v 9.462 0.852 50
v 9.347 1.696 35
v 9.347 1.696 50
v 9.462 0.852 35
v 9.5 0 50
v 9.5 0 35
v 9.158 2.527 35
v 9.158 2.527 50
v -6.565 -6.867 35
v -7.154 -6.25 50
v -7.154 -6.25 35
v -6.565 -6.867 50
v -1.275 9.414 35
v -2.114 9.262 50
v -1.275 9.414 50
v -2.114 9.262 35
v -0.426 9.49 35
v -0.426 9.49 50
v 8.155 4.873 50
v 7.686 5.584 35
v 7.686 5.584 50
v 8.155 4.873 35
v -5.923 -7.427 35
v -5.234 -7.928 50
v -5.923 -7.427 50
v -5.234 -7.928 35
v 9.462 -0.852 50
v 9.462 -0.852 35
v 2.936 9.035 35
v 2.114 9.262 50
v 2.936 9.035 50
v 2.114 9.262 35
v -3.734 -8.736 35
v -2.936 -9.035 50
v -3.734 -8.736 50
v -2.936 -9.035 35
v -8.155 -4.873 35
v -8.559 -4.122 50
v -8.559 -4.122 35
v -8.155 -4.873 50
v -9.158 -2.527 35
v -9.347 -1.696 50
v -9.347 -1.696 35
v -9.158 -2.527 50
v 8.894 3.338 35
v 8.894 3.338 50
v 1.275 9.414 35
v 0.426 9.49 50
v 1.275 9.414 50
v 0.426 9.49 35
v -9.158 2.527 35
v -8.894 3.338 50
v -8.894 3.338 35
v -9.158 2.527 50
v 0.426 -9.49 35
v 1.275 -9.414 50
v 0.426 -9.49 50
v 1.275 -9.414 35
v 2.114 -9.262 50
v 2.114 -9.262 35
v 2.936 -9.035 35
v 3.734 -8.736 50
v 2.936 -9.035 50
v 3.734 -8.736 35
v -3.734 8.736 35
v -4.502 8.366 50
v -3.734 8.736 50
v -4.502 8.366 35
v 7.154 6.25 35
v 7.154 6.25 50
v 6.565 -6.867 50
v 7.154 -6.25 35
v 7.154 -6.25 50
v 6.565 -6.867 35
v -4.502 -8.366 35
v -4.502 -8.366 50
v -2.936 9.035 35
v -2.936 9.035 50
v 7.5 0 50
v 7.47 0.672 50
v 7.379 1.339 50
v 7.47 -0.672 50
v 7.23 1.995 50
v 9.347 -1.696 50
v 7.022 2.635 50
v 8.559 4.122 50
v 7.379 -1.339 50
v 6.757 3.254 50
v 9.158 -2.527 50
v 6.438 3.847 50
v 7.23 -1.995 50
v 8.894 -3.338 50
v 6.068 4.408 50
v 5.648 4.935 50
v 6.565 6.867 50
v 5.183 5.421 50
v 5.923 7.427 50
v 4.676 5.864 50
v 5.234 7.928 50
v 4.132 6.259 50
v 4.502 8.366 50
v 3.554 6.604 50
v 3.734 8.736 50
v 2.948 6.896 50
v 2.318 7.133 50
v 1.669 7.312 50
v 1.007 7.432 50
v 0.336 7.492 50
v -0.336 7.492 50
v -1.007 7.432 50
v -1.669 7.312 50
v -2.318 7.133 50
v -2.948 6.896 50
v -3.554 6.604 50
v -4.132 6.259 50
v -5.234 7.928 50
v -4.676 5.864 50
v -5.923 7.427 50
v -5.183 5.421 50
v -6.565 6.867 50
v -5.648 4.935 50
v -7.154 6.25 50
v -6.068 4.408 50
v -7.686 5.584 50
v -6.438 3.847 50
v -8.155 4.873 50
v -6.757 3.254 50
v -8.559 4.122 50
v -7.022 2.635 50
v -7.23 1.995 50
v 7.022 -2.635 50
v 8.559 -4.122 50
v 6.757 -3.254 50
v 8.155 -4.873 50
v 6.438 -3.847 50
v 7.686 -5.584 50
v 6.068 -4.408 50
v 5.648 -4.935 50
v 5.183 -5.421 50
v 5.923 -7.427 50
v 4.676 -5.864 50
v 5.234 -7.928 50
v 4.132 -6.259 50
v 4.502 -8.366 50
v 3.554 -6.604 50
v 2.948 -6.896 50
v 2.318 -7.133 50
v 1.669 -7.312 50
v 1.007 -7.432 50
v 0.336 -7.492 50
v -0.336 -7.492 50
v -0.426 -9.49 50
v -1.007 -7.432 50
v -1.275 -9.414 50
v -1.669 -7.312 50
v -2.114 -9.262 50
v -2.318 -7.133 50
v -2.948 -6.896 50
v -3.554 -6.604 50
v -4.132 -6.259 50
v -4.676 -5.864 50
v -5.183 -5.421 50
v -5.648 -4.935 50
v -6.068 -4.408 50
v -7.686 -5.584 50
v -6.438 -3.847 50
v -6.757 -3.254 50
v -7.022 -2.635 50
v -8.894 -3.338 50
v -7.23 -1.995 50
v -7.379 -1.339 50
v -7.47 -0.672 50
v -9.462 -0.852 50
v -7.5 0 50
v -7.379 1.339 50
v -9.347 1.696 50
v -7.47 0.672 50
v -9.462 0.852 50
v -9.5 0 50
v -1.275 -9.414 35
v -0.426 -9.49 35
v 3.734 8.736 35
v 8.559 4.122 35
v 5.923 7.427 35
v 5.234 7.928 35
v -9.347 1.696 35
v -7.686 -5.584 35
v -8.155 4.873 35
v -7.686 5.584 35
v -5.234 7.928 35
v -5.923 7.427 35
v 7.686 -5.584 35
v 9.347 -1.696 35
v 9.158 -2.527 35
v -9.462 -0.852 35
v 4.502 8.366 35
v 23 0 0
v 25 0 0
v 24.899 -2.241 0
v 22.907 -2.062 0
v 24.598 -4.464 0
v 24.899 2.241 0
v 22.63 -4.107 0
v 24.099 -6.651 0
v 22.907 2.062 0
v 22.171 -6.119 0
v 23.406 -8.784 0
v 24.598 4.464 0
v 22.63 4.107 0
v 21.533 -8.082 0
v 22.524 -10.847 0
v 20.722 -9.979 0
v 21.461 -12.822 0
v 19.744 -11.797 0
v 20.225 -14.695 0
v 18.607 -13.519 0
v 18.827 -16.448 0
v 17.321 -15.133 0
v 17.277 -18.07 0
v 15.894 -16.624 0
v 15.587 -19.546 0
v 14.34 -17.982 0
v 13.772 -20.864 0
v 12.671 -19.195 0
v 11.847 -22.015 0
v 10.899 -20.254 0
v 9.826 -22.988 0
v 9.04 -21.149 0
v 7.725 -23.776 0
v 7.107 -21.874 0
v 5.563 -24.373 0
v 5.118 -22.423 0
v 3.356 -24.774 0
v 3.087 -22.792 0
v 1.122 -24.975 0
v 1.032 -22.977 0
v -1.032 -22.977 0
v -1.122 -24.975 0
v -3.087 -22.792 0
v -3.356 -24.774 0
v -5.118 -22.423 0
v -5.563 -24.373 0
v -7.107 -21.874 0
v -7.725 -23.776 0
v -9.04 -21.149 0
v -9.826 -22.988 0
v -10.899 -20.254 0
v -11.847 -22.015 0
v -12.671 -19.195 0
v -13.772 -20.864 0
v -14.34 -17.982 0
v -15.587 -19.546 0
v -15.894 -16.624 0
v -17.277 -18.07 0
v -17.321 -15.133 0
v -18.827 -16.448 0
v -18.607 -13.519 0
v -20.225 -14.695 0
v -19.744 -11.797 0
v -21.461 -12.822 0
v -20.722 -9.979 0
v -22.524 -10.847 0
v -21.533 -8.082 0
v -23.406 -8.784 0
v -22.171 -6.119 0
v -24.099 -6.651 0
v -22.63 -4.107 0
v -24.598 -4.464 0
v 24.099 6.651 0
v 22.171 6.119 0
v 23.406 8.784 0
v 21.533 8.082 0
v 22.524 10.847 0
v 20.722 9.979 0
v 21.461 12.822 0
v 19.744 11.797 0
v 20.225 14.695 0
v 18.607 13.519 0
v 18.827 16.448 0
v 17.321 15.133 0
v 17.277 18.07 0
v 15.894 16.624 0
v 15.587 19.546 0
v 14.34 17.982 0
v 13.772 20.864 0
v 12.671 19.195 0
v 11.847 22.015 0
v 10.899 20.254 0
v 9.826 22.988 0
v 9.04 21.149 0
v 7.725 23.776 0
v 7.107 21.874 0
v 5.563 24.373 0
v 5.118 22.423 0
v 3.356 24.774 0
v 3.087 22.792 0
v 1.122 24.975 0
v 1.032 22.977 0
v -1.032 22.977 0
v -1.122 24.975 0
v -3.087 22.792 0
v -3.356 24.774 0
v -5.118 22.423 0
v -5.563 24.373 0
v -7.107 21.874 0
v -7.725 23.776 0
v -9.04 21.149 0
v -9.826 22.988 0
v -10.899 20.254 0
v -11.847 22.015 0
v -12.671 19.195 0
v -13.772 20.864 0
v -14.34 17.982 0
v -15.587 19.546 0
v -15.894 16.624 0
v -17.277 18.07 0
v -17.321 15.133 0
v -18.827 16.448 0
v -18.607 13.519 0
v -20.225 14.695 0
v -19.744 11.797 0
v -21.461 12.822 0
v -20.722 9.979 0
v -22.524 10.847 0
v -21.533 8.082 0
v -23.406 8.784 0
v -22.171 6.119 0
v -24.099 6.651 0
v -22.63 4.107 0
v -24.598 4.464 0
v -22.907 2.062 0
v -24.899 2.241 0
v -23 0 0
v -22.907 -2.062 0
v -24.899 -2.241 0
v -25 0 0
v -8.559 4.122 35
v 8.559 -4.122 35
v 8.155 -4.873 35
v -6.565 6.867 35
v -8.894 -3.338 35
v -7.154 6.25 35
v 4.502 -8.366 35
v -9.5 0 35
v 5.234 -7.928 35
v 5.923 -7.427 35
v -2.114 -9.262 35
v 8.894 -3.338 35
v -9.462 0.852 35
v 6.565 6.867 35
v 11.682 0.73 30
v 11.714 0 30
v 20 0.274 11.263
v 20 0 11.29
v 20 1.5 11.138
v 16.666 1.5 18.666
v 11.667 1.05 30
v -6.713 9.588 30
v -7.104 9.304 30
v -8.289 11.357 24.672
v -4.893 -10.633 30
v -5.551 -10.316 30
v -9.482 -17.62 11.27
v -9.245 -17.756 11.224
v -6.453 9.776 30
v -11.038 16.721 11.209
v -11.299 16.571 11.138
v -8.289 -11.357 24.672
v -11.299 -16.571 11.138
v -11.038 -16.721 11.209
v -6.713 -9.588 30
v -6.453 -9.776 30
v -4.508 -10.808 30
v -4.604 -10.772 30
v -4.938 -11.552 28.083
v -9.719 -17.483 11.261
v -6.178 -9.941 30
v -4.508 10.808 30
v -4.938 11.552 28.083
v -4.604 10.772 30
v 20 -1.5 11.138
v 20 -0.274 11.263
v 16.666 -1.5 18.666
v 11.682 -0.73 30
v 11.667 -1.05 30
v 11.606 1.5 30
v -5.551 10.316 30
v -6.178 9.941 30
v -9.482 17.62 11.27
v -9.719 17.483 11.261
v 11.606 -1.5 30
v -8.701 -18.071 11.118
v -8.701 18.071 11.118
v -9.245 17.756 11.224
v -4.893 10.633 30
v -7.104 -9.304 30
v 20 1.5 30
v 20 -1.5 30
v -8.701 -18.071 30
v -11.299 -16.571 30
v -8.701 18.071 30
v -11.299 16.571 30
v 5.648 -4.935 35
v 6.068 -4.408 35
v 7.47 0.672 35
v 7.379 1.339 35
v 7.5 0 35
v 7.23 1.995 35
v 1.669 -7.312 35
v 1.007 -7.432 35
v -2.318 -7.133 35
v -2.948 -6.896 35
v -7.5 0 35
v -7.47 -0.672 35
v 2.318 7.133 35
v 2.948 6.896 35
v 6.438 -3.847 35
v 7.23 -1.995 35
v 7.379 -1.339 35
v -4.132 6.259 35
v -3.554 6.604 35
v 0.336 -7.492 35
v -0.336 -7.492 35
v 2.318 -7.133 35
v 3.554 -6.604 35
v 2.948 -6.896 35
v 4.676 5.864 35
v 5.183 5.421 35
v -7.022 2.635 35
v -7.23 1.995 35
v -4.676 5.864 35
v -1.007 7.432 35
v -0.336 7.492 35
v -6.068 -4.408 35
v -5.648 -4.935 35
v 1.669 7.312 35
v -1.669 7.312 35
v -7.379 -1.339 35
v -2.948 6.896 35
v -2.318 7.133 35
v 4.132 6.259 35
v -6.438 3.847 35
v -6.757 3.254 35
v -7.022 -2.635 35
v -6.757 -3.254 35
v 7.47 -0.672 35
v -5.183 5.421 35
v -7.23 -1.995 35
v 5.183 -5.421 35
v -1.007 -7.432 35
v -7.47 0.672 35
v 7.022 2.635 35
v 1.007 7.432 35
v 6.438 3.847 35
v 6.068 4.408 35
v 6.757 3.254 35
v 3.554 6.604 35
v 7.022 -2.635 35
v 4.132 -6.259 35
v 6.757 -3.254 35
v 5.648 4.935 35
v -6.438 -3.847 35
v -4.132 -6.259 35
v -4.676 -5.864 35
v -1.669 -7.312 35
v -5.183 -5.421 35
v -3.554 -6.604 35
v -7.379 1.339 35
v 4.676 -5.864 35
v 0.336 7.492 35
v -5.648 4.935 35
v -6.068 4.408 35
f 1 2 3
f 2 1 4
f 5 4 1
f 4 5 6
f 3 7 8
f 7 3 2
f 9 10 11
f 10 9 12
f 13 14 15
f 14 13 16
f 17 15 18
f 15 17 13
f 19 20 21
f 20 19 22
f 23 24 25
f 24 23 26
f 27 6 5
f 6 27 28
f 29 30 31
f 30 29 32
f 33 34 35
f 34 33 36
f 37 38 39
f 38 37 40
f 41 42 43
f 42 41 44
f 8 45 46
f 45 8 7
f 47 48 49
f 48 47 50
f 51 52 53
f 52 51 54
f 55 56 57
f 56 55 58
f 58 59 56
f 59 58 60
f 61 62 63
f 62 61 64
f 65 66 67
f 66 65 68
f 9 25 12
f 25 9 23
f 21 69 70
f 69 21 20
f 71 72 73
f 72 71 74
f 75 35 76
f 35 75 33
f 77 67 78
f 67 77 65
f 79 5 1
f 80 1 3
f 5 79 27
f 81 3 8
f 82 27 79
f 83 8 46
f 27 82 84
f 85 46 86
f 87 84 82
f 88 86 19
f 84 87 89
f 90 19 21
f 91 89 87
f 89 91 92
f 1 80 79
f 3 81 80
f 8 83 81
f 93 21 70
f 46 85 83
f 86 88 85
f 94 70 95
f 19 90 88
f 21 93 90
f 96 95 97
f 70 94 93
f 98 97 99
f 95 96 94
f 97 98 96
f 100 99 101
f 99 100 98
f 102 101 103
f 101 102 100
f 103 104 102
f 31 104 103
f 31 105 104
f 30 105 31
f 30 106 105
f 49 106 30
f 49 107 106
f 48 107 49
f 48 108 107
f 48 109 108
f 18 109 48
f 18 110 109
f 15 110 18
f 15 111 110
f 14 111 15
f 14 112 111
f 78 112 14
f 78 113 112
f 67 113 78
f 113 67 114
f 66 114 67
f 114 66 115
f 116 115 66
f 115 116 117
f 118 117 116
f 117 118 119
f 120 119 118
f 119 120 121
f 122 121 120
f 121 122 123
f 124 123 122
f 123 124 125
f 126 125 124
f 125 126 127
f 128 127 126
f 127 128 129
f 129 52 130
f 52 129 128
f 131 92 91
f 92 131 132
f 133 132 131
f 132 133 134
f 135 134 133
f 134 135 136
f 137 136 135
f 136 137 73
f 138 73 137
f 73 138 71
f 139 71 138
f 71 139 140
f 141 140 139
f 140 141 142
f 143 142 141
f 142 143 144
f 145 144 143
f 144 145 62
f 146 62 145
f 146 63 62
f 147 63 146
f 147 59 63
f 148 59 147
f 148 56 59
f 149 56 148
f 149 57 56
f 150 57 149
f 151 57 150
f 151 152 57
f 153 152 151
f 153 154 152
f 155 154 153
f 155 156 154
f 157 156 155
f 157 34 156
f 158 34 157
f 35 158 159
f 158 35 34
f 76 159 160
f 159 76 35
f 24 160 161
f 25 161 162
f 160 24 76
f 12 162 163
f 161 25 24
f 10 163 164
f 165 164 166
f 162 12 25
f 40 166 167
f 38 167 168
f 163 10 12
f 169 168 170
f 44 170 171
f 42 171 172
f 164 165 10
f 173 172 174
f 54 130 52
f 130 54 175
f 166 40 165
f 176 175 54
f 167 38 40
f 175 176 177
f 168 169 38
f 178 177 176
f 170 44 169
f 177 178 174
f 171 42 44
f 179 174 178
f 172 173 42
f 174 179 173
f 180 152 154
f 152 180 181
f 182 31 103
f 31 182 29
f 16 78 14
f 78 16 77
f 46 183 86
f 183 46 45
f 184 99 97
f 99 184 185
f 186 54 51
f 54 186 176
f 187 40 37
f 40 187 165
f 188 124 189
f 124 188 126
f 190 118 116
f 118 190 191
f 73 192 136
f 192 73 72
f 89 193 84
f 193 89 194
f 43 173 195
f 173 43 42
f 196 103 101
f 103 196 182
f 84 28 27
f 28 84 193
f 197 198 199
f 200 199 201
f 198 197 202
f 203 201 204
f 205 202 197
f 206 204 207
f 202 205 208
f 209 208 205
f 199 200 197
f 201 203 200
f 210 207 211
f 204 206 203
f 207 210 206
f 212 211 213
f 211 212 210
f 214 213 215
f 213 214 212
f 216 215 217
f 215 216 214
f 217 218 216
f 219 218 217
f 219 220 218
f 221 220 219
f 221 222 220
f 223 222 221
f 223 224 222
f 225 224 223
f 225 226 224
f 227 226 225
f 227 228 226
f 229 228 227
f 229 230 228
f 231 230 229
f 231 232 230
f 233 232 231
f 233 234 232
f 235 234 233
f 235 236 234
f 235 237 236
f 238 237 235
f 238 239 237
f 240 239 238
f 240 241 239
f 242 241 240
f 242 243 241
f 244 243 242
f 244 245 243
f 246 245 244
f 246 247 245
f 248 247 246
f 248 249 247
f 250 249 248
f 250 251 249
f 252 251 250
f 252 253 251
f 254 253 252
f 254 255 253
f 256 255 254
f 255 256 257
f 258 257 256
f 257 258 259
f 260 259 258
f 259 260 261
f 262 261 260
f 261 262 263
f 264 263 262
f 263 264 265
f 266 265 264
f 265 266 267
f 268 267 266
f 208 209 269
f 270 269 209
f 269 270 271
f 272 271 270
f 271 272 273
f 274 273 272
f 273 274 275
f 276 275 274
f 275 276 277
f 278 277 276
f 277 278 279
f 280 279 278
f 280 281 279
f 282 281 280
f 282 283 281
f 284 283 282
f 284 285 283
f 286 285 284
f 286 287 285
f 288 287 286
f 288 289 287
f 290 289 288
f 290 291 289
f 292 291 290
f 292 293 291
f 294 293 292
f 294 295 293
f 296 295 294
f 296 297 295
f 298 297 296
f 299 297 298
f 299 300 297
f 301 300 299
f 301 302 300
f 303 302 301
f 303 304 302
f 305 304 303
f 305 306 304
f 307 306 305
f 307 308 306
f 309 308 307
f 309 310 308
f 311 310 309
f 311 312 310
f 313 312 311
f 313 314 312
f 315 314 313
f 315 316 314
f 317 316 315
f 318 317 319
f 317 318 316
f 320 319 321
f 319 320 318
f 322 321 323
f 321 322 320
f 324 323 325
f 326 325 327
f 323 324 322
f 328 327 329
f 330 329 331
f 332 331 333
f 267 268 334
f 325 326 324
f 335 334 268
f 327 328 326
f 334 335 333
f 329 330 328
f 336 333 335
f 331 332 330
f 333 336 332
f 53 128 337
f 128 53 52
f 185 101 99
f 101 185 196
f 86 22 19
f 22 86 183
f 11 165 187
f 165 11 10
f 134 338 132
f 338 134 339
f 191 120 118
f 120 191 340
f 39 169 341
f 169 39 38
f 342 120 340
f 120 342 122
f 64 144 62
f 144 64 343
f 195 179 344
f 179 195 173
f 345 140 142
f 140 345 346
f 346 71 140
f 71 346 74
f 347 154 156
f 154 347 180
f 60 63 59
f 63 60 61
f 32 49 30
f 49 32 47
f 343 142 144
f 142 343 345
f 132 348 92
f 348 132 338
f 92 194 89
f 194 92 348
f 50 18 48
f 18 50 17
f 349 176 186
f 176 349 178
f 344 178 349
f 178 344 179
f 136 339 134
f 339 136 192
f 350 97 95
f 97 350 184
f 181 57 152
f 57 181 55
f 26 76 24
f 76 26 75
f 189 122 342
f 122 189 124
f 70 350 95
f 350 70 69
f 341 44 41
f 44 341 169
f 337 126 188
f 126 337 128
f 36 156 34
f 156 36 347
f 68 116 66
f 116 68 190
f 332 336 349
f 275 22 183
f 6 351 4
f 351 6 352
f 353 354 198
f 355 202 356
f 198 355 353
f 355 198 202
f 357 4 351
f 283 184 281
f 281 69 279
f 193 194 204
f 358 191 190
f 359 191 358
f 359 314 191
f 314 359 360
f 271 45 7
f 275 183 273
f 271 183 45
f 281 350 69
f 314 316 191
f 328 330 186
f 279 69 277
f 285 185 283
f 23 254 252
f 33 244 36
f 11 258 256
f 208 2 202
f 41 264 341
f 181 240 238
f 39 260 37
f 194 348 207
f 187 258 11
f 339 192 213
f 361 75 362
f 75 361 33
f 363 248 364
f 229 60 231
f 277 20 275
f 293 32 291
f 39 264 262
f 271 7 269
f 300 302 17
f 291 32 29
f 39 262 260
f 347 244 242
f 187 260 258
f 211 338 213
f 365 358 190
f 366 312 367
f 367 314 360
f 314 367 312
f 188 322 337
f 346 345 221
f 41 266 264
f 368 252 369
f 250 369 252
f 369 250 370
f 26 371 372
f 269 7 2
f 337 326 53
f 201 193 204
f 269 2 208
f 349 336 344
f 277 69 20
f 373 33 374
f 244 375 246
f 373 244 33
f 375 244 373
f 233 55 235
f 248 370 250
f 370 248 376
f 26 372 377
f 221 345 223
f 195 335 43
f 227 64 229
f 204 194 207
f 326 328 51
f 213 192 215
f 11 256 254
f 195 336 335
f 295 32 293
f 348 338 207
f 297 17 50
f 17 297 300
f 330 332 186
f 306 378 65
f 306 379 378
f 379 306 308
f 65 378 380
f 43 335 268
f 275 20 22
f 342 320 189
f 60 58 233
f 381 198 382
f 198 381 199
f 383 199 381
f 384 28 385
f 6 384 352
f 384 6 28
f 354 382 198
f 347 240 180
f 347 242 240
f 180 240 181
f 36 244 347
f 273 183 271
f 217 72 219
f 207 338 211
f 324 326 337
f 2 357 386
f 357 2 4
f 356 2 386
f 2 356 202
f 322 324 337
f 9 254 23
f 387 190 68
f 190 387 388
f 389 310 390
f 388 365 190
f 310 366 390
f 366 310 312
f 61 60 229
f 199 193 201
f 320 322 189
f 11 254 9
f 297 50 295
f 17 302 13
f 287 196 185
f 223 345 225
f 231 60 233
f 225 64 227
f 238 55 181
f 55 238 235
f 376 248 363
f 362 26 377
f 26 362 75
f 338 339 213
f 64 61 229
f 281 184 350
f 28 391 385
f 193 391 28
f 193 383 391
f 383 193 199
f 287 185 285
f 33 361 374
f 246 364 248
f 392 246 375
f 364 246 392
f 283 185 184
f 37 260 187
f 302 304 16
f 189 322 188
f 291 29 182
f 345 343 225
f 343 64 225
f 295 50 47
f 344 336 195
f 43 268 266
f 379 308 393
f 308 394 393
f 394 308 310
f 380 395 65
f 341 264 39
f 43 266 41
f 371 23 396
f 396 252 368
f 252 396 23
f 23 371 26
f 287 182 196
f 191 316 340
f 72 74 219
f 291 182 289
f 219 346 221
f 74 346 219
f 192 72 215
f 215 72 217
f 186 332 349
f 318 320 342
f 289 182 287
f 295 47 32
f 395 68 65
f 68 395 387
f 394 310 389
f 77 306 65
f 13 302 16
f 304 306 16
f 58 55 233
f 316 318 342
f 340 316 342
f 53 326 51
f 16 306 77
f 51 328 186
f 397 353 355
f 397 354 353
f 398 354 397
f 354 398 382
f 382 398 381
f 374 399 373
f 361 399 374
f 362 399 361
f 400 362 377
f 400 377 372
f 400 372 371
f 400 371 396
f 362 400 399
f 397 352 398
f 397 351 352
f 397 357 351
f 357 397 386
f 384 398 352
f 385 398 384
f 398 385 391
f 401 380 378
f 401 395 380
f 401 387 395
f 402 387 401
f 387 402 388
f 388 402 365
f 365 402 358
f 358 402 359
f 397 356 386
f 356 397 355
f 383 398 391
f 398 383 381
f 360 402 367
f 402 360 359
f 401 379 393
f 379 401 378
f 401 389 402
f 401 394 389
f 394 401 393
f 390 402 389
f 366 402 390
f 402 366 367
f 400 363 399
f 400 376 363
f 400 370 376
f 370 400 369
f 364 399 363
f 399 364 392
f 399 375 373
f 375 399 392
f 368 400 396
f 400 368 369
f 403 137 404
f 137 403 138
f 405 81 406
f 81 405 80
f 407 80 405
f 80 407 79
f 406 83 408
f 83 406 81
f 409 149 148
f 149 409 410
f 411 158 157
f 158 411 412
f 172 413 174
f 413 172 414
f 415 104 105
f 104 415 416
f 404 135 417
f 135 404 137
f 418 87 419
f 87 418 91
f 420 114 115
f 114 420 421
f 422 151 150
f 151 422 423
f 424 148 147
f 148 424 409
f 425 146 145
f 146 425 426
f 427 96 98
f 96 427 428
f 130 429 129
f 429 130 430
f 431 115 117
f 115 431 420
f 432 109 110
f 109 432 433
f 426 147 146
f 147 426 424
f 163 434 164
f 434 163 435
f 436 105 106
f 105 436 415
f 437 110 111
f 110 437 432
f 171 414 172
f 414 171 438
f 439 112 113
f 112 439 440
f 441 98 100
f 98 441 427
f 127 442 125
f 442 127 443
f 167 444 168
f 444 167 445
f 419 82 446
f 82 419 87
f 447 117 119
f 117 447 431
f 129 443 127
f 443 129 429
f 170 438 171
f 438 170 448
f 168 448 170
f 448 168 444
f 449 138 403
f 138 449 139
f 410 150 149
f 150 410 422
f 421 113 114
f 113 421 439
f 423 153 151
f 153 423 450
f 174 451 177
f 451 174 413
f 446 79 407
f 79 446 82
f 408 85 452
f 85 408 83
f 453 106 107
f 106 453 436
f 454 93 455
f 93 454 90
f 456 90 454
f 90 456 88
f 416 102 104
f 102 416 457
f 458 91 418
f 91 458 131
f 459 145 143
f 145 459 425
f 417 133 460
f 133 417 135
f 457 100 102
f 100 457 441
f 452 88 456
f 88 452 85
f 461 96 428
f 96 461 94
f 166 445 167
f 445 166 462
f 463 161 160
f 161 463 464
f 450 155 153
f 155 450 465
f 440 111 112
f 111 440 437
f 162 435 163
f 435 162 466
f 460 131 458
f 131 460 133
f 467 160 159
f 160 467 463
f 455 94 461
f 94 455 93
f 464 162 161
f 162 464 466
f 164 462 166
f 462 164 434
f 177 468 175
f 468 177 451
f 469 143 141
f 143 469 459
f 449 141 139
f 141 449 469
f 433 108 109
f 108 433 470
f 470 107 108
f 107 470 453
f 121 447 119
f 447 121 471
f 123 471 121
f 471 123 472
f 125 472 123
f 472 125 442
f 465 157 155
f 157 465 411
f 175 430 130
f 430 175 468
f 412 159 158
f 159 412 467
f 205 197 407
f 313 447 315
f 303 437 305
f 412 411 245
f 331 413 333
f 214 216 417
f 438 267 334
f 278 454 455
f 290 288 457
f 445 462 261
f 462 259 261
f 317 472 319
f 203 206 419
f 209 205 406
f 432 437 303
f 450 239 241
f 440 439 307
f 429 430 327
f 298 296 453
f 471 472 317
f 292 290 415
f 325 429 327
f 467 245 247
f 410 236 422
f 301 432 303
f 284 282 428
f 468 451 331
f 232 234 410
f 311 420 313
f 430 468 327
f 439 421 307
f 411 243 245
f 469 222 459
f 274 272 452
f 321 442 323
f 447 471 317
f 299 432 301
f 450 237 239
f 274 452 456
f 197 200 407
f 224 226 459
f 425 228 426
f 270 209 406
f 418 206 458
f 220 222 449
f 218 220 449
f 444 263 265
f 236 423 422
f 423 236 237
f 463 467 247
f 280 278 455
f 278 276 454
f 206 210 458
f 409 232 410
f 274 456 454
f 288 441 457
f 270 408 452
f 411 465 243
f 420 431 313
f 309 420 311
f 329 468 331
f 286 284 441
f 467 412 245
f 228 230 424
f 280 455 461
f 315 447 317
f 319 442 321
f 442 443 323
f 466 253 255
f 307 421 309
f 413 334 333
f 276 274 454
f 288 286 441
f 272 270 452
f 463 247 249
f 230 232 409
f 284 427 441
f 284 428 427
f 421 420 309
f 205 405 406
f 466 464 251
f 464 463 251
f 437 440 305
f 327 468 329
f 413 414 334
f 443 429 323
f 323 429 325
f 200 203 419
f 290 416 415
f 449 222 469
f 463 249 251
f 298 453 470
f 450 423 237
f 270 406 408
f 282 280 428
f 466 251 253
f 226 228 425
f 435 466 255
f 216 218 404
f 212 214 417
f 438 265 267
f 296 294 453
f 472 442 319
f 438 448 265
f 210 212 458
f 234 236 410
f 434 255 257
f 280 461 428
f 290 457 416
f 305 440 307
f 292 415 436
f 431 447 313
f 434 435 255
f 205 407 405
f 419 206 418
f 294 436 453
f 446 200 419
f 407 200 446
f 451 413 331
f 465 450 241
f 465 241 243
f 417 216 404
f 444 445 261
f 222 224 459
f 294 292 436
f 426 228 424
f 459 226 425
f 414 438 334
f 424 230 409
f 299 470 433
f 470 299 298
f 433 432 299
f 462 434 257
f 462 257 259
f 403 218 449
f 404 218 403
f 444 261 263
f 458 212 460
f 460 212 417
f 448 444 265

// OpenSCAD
$fn=70;

nozzleOD = 19;
nozzleLength = 15;

funnelHeight = 35;
funnelDiameter = 50;

wallThickness = 2;

finWidth = 3;

difference(){
    positive();
    negative();
}
module positive(){
    cylinder(d=nozzleOD,h=nozzleLength + funnelHeight);
    cylinder(d1=funnelDiameter,d2=nozzleOD,h=funnelHeight);
    rotate([0,0,0]) fin();
    rotate([0,0,120]) fin();
    rotate([0,0,240]) fin();
}
module fin(){
    translate([0,-(finWidth/2),0]) cube([funnelDiameter/2-5,finWidth,funnelHeight-5]);
}
module negative(){
    cylinder(d=nozzleOD-(wallThickness*2),h=nozzleLength + funnelHeight);
    cylinder(d1=funnelDiameter-(wallThickness*2),d2=nozzleOD-(wallThickness*2),h=35);
}
